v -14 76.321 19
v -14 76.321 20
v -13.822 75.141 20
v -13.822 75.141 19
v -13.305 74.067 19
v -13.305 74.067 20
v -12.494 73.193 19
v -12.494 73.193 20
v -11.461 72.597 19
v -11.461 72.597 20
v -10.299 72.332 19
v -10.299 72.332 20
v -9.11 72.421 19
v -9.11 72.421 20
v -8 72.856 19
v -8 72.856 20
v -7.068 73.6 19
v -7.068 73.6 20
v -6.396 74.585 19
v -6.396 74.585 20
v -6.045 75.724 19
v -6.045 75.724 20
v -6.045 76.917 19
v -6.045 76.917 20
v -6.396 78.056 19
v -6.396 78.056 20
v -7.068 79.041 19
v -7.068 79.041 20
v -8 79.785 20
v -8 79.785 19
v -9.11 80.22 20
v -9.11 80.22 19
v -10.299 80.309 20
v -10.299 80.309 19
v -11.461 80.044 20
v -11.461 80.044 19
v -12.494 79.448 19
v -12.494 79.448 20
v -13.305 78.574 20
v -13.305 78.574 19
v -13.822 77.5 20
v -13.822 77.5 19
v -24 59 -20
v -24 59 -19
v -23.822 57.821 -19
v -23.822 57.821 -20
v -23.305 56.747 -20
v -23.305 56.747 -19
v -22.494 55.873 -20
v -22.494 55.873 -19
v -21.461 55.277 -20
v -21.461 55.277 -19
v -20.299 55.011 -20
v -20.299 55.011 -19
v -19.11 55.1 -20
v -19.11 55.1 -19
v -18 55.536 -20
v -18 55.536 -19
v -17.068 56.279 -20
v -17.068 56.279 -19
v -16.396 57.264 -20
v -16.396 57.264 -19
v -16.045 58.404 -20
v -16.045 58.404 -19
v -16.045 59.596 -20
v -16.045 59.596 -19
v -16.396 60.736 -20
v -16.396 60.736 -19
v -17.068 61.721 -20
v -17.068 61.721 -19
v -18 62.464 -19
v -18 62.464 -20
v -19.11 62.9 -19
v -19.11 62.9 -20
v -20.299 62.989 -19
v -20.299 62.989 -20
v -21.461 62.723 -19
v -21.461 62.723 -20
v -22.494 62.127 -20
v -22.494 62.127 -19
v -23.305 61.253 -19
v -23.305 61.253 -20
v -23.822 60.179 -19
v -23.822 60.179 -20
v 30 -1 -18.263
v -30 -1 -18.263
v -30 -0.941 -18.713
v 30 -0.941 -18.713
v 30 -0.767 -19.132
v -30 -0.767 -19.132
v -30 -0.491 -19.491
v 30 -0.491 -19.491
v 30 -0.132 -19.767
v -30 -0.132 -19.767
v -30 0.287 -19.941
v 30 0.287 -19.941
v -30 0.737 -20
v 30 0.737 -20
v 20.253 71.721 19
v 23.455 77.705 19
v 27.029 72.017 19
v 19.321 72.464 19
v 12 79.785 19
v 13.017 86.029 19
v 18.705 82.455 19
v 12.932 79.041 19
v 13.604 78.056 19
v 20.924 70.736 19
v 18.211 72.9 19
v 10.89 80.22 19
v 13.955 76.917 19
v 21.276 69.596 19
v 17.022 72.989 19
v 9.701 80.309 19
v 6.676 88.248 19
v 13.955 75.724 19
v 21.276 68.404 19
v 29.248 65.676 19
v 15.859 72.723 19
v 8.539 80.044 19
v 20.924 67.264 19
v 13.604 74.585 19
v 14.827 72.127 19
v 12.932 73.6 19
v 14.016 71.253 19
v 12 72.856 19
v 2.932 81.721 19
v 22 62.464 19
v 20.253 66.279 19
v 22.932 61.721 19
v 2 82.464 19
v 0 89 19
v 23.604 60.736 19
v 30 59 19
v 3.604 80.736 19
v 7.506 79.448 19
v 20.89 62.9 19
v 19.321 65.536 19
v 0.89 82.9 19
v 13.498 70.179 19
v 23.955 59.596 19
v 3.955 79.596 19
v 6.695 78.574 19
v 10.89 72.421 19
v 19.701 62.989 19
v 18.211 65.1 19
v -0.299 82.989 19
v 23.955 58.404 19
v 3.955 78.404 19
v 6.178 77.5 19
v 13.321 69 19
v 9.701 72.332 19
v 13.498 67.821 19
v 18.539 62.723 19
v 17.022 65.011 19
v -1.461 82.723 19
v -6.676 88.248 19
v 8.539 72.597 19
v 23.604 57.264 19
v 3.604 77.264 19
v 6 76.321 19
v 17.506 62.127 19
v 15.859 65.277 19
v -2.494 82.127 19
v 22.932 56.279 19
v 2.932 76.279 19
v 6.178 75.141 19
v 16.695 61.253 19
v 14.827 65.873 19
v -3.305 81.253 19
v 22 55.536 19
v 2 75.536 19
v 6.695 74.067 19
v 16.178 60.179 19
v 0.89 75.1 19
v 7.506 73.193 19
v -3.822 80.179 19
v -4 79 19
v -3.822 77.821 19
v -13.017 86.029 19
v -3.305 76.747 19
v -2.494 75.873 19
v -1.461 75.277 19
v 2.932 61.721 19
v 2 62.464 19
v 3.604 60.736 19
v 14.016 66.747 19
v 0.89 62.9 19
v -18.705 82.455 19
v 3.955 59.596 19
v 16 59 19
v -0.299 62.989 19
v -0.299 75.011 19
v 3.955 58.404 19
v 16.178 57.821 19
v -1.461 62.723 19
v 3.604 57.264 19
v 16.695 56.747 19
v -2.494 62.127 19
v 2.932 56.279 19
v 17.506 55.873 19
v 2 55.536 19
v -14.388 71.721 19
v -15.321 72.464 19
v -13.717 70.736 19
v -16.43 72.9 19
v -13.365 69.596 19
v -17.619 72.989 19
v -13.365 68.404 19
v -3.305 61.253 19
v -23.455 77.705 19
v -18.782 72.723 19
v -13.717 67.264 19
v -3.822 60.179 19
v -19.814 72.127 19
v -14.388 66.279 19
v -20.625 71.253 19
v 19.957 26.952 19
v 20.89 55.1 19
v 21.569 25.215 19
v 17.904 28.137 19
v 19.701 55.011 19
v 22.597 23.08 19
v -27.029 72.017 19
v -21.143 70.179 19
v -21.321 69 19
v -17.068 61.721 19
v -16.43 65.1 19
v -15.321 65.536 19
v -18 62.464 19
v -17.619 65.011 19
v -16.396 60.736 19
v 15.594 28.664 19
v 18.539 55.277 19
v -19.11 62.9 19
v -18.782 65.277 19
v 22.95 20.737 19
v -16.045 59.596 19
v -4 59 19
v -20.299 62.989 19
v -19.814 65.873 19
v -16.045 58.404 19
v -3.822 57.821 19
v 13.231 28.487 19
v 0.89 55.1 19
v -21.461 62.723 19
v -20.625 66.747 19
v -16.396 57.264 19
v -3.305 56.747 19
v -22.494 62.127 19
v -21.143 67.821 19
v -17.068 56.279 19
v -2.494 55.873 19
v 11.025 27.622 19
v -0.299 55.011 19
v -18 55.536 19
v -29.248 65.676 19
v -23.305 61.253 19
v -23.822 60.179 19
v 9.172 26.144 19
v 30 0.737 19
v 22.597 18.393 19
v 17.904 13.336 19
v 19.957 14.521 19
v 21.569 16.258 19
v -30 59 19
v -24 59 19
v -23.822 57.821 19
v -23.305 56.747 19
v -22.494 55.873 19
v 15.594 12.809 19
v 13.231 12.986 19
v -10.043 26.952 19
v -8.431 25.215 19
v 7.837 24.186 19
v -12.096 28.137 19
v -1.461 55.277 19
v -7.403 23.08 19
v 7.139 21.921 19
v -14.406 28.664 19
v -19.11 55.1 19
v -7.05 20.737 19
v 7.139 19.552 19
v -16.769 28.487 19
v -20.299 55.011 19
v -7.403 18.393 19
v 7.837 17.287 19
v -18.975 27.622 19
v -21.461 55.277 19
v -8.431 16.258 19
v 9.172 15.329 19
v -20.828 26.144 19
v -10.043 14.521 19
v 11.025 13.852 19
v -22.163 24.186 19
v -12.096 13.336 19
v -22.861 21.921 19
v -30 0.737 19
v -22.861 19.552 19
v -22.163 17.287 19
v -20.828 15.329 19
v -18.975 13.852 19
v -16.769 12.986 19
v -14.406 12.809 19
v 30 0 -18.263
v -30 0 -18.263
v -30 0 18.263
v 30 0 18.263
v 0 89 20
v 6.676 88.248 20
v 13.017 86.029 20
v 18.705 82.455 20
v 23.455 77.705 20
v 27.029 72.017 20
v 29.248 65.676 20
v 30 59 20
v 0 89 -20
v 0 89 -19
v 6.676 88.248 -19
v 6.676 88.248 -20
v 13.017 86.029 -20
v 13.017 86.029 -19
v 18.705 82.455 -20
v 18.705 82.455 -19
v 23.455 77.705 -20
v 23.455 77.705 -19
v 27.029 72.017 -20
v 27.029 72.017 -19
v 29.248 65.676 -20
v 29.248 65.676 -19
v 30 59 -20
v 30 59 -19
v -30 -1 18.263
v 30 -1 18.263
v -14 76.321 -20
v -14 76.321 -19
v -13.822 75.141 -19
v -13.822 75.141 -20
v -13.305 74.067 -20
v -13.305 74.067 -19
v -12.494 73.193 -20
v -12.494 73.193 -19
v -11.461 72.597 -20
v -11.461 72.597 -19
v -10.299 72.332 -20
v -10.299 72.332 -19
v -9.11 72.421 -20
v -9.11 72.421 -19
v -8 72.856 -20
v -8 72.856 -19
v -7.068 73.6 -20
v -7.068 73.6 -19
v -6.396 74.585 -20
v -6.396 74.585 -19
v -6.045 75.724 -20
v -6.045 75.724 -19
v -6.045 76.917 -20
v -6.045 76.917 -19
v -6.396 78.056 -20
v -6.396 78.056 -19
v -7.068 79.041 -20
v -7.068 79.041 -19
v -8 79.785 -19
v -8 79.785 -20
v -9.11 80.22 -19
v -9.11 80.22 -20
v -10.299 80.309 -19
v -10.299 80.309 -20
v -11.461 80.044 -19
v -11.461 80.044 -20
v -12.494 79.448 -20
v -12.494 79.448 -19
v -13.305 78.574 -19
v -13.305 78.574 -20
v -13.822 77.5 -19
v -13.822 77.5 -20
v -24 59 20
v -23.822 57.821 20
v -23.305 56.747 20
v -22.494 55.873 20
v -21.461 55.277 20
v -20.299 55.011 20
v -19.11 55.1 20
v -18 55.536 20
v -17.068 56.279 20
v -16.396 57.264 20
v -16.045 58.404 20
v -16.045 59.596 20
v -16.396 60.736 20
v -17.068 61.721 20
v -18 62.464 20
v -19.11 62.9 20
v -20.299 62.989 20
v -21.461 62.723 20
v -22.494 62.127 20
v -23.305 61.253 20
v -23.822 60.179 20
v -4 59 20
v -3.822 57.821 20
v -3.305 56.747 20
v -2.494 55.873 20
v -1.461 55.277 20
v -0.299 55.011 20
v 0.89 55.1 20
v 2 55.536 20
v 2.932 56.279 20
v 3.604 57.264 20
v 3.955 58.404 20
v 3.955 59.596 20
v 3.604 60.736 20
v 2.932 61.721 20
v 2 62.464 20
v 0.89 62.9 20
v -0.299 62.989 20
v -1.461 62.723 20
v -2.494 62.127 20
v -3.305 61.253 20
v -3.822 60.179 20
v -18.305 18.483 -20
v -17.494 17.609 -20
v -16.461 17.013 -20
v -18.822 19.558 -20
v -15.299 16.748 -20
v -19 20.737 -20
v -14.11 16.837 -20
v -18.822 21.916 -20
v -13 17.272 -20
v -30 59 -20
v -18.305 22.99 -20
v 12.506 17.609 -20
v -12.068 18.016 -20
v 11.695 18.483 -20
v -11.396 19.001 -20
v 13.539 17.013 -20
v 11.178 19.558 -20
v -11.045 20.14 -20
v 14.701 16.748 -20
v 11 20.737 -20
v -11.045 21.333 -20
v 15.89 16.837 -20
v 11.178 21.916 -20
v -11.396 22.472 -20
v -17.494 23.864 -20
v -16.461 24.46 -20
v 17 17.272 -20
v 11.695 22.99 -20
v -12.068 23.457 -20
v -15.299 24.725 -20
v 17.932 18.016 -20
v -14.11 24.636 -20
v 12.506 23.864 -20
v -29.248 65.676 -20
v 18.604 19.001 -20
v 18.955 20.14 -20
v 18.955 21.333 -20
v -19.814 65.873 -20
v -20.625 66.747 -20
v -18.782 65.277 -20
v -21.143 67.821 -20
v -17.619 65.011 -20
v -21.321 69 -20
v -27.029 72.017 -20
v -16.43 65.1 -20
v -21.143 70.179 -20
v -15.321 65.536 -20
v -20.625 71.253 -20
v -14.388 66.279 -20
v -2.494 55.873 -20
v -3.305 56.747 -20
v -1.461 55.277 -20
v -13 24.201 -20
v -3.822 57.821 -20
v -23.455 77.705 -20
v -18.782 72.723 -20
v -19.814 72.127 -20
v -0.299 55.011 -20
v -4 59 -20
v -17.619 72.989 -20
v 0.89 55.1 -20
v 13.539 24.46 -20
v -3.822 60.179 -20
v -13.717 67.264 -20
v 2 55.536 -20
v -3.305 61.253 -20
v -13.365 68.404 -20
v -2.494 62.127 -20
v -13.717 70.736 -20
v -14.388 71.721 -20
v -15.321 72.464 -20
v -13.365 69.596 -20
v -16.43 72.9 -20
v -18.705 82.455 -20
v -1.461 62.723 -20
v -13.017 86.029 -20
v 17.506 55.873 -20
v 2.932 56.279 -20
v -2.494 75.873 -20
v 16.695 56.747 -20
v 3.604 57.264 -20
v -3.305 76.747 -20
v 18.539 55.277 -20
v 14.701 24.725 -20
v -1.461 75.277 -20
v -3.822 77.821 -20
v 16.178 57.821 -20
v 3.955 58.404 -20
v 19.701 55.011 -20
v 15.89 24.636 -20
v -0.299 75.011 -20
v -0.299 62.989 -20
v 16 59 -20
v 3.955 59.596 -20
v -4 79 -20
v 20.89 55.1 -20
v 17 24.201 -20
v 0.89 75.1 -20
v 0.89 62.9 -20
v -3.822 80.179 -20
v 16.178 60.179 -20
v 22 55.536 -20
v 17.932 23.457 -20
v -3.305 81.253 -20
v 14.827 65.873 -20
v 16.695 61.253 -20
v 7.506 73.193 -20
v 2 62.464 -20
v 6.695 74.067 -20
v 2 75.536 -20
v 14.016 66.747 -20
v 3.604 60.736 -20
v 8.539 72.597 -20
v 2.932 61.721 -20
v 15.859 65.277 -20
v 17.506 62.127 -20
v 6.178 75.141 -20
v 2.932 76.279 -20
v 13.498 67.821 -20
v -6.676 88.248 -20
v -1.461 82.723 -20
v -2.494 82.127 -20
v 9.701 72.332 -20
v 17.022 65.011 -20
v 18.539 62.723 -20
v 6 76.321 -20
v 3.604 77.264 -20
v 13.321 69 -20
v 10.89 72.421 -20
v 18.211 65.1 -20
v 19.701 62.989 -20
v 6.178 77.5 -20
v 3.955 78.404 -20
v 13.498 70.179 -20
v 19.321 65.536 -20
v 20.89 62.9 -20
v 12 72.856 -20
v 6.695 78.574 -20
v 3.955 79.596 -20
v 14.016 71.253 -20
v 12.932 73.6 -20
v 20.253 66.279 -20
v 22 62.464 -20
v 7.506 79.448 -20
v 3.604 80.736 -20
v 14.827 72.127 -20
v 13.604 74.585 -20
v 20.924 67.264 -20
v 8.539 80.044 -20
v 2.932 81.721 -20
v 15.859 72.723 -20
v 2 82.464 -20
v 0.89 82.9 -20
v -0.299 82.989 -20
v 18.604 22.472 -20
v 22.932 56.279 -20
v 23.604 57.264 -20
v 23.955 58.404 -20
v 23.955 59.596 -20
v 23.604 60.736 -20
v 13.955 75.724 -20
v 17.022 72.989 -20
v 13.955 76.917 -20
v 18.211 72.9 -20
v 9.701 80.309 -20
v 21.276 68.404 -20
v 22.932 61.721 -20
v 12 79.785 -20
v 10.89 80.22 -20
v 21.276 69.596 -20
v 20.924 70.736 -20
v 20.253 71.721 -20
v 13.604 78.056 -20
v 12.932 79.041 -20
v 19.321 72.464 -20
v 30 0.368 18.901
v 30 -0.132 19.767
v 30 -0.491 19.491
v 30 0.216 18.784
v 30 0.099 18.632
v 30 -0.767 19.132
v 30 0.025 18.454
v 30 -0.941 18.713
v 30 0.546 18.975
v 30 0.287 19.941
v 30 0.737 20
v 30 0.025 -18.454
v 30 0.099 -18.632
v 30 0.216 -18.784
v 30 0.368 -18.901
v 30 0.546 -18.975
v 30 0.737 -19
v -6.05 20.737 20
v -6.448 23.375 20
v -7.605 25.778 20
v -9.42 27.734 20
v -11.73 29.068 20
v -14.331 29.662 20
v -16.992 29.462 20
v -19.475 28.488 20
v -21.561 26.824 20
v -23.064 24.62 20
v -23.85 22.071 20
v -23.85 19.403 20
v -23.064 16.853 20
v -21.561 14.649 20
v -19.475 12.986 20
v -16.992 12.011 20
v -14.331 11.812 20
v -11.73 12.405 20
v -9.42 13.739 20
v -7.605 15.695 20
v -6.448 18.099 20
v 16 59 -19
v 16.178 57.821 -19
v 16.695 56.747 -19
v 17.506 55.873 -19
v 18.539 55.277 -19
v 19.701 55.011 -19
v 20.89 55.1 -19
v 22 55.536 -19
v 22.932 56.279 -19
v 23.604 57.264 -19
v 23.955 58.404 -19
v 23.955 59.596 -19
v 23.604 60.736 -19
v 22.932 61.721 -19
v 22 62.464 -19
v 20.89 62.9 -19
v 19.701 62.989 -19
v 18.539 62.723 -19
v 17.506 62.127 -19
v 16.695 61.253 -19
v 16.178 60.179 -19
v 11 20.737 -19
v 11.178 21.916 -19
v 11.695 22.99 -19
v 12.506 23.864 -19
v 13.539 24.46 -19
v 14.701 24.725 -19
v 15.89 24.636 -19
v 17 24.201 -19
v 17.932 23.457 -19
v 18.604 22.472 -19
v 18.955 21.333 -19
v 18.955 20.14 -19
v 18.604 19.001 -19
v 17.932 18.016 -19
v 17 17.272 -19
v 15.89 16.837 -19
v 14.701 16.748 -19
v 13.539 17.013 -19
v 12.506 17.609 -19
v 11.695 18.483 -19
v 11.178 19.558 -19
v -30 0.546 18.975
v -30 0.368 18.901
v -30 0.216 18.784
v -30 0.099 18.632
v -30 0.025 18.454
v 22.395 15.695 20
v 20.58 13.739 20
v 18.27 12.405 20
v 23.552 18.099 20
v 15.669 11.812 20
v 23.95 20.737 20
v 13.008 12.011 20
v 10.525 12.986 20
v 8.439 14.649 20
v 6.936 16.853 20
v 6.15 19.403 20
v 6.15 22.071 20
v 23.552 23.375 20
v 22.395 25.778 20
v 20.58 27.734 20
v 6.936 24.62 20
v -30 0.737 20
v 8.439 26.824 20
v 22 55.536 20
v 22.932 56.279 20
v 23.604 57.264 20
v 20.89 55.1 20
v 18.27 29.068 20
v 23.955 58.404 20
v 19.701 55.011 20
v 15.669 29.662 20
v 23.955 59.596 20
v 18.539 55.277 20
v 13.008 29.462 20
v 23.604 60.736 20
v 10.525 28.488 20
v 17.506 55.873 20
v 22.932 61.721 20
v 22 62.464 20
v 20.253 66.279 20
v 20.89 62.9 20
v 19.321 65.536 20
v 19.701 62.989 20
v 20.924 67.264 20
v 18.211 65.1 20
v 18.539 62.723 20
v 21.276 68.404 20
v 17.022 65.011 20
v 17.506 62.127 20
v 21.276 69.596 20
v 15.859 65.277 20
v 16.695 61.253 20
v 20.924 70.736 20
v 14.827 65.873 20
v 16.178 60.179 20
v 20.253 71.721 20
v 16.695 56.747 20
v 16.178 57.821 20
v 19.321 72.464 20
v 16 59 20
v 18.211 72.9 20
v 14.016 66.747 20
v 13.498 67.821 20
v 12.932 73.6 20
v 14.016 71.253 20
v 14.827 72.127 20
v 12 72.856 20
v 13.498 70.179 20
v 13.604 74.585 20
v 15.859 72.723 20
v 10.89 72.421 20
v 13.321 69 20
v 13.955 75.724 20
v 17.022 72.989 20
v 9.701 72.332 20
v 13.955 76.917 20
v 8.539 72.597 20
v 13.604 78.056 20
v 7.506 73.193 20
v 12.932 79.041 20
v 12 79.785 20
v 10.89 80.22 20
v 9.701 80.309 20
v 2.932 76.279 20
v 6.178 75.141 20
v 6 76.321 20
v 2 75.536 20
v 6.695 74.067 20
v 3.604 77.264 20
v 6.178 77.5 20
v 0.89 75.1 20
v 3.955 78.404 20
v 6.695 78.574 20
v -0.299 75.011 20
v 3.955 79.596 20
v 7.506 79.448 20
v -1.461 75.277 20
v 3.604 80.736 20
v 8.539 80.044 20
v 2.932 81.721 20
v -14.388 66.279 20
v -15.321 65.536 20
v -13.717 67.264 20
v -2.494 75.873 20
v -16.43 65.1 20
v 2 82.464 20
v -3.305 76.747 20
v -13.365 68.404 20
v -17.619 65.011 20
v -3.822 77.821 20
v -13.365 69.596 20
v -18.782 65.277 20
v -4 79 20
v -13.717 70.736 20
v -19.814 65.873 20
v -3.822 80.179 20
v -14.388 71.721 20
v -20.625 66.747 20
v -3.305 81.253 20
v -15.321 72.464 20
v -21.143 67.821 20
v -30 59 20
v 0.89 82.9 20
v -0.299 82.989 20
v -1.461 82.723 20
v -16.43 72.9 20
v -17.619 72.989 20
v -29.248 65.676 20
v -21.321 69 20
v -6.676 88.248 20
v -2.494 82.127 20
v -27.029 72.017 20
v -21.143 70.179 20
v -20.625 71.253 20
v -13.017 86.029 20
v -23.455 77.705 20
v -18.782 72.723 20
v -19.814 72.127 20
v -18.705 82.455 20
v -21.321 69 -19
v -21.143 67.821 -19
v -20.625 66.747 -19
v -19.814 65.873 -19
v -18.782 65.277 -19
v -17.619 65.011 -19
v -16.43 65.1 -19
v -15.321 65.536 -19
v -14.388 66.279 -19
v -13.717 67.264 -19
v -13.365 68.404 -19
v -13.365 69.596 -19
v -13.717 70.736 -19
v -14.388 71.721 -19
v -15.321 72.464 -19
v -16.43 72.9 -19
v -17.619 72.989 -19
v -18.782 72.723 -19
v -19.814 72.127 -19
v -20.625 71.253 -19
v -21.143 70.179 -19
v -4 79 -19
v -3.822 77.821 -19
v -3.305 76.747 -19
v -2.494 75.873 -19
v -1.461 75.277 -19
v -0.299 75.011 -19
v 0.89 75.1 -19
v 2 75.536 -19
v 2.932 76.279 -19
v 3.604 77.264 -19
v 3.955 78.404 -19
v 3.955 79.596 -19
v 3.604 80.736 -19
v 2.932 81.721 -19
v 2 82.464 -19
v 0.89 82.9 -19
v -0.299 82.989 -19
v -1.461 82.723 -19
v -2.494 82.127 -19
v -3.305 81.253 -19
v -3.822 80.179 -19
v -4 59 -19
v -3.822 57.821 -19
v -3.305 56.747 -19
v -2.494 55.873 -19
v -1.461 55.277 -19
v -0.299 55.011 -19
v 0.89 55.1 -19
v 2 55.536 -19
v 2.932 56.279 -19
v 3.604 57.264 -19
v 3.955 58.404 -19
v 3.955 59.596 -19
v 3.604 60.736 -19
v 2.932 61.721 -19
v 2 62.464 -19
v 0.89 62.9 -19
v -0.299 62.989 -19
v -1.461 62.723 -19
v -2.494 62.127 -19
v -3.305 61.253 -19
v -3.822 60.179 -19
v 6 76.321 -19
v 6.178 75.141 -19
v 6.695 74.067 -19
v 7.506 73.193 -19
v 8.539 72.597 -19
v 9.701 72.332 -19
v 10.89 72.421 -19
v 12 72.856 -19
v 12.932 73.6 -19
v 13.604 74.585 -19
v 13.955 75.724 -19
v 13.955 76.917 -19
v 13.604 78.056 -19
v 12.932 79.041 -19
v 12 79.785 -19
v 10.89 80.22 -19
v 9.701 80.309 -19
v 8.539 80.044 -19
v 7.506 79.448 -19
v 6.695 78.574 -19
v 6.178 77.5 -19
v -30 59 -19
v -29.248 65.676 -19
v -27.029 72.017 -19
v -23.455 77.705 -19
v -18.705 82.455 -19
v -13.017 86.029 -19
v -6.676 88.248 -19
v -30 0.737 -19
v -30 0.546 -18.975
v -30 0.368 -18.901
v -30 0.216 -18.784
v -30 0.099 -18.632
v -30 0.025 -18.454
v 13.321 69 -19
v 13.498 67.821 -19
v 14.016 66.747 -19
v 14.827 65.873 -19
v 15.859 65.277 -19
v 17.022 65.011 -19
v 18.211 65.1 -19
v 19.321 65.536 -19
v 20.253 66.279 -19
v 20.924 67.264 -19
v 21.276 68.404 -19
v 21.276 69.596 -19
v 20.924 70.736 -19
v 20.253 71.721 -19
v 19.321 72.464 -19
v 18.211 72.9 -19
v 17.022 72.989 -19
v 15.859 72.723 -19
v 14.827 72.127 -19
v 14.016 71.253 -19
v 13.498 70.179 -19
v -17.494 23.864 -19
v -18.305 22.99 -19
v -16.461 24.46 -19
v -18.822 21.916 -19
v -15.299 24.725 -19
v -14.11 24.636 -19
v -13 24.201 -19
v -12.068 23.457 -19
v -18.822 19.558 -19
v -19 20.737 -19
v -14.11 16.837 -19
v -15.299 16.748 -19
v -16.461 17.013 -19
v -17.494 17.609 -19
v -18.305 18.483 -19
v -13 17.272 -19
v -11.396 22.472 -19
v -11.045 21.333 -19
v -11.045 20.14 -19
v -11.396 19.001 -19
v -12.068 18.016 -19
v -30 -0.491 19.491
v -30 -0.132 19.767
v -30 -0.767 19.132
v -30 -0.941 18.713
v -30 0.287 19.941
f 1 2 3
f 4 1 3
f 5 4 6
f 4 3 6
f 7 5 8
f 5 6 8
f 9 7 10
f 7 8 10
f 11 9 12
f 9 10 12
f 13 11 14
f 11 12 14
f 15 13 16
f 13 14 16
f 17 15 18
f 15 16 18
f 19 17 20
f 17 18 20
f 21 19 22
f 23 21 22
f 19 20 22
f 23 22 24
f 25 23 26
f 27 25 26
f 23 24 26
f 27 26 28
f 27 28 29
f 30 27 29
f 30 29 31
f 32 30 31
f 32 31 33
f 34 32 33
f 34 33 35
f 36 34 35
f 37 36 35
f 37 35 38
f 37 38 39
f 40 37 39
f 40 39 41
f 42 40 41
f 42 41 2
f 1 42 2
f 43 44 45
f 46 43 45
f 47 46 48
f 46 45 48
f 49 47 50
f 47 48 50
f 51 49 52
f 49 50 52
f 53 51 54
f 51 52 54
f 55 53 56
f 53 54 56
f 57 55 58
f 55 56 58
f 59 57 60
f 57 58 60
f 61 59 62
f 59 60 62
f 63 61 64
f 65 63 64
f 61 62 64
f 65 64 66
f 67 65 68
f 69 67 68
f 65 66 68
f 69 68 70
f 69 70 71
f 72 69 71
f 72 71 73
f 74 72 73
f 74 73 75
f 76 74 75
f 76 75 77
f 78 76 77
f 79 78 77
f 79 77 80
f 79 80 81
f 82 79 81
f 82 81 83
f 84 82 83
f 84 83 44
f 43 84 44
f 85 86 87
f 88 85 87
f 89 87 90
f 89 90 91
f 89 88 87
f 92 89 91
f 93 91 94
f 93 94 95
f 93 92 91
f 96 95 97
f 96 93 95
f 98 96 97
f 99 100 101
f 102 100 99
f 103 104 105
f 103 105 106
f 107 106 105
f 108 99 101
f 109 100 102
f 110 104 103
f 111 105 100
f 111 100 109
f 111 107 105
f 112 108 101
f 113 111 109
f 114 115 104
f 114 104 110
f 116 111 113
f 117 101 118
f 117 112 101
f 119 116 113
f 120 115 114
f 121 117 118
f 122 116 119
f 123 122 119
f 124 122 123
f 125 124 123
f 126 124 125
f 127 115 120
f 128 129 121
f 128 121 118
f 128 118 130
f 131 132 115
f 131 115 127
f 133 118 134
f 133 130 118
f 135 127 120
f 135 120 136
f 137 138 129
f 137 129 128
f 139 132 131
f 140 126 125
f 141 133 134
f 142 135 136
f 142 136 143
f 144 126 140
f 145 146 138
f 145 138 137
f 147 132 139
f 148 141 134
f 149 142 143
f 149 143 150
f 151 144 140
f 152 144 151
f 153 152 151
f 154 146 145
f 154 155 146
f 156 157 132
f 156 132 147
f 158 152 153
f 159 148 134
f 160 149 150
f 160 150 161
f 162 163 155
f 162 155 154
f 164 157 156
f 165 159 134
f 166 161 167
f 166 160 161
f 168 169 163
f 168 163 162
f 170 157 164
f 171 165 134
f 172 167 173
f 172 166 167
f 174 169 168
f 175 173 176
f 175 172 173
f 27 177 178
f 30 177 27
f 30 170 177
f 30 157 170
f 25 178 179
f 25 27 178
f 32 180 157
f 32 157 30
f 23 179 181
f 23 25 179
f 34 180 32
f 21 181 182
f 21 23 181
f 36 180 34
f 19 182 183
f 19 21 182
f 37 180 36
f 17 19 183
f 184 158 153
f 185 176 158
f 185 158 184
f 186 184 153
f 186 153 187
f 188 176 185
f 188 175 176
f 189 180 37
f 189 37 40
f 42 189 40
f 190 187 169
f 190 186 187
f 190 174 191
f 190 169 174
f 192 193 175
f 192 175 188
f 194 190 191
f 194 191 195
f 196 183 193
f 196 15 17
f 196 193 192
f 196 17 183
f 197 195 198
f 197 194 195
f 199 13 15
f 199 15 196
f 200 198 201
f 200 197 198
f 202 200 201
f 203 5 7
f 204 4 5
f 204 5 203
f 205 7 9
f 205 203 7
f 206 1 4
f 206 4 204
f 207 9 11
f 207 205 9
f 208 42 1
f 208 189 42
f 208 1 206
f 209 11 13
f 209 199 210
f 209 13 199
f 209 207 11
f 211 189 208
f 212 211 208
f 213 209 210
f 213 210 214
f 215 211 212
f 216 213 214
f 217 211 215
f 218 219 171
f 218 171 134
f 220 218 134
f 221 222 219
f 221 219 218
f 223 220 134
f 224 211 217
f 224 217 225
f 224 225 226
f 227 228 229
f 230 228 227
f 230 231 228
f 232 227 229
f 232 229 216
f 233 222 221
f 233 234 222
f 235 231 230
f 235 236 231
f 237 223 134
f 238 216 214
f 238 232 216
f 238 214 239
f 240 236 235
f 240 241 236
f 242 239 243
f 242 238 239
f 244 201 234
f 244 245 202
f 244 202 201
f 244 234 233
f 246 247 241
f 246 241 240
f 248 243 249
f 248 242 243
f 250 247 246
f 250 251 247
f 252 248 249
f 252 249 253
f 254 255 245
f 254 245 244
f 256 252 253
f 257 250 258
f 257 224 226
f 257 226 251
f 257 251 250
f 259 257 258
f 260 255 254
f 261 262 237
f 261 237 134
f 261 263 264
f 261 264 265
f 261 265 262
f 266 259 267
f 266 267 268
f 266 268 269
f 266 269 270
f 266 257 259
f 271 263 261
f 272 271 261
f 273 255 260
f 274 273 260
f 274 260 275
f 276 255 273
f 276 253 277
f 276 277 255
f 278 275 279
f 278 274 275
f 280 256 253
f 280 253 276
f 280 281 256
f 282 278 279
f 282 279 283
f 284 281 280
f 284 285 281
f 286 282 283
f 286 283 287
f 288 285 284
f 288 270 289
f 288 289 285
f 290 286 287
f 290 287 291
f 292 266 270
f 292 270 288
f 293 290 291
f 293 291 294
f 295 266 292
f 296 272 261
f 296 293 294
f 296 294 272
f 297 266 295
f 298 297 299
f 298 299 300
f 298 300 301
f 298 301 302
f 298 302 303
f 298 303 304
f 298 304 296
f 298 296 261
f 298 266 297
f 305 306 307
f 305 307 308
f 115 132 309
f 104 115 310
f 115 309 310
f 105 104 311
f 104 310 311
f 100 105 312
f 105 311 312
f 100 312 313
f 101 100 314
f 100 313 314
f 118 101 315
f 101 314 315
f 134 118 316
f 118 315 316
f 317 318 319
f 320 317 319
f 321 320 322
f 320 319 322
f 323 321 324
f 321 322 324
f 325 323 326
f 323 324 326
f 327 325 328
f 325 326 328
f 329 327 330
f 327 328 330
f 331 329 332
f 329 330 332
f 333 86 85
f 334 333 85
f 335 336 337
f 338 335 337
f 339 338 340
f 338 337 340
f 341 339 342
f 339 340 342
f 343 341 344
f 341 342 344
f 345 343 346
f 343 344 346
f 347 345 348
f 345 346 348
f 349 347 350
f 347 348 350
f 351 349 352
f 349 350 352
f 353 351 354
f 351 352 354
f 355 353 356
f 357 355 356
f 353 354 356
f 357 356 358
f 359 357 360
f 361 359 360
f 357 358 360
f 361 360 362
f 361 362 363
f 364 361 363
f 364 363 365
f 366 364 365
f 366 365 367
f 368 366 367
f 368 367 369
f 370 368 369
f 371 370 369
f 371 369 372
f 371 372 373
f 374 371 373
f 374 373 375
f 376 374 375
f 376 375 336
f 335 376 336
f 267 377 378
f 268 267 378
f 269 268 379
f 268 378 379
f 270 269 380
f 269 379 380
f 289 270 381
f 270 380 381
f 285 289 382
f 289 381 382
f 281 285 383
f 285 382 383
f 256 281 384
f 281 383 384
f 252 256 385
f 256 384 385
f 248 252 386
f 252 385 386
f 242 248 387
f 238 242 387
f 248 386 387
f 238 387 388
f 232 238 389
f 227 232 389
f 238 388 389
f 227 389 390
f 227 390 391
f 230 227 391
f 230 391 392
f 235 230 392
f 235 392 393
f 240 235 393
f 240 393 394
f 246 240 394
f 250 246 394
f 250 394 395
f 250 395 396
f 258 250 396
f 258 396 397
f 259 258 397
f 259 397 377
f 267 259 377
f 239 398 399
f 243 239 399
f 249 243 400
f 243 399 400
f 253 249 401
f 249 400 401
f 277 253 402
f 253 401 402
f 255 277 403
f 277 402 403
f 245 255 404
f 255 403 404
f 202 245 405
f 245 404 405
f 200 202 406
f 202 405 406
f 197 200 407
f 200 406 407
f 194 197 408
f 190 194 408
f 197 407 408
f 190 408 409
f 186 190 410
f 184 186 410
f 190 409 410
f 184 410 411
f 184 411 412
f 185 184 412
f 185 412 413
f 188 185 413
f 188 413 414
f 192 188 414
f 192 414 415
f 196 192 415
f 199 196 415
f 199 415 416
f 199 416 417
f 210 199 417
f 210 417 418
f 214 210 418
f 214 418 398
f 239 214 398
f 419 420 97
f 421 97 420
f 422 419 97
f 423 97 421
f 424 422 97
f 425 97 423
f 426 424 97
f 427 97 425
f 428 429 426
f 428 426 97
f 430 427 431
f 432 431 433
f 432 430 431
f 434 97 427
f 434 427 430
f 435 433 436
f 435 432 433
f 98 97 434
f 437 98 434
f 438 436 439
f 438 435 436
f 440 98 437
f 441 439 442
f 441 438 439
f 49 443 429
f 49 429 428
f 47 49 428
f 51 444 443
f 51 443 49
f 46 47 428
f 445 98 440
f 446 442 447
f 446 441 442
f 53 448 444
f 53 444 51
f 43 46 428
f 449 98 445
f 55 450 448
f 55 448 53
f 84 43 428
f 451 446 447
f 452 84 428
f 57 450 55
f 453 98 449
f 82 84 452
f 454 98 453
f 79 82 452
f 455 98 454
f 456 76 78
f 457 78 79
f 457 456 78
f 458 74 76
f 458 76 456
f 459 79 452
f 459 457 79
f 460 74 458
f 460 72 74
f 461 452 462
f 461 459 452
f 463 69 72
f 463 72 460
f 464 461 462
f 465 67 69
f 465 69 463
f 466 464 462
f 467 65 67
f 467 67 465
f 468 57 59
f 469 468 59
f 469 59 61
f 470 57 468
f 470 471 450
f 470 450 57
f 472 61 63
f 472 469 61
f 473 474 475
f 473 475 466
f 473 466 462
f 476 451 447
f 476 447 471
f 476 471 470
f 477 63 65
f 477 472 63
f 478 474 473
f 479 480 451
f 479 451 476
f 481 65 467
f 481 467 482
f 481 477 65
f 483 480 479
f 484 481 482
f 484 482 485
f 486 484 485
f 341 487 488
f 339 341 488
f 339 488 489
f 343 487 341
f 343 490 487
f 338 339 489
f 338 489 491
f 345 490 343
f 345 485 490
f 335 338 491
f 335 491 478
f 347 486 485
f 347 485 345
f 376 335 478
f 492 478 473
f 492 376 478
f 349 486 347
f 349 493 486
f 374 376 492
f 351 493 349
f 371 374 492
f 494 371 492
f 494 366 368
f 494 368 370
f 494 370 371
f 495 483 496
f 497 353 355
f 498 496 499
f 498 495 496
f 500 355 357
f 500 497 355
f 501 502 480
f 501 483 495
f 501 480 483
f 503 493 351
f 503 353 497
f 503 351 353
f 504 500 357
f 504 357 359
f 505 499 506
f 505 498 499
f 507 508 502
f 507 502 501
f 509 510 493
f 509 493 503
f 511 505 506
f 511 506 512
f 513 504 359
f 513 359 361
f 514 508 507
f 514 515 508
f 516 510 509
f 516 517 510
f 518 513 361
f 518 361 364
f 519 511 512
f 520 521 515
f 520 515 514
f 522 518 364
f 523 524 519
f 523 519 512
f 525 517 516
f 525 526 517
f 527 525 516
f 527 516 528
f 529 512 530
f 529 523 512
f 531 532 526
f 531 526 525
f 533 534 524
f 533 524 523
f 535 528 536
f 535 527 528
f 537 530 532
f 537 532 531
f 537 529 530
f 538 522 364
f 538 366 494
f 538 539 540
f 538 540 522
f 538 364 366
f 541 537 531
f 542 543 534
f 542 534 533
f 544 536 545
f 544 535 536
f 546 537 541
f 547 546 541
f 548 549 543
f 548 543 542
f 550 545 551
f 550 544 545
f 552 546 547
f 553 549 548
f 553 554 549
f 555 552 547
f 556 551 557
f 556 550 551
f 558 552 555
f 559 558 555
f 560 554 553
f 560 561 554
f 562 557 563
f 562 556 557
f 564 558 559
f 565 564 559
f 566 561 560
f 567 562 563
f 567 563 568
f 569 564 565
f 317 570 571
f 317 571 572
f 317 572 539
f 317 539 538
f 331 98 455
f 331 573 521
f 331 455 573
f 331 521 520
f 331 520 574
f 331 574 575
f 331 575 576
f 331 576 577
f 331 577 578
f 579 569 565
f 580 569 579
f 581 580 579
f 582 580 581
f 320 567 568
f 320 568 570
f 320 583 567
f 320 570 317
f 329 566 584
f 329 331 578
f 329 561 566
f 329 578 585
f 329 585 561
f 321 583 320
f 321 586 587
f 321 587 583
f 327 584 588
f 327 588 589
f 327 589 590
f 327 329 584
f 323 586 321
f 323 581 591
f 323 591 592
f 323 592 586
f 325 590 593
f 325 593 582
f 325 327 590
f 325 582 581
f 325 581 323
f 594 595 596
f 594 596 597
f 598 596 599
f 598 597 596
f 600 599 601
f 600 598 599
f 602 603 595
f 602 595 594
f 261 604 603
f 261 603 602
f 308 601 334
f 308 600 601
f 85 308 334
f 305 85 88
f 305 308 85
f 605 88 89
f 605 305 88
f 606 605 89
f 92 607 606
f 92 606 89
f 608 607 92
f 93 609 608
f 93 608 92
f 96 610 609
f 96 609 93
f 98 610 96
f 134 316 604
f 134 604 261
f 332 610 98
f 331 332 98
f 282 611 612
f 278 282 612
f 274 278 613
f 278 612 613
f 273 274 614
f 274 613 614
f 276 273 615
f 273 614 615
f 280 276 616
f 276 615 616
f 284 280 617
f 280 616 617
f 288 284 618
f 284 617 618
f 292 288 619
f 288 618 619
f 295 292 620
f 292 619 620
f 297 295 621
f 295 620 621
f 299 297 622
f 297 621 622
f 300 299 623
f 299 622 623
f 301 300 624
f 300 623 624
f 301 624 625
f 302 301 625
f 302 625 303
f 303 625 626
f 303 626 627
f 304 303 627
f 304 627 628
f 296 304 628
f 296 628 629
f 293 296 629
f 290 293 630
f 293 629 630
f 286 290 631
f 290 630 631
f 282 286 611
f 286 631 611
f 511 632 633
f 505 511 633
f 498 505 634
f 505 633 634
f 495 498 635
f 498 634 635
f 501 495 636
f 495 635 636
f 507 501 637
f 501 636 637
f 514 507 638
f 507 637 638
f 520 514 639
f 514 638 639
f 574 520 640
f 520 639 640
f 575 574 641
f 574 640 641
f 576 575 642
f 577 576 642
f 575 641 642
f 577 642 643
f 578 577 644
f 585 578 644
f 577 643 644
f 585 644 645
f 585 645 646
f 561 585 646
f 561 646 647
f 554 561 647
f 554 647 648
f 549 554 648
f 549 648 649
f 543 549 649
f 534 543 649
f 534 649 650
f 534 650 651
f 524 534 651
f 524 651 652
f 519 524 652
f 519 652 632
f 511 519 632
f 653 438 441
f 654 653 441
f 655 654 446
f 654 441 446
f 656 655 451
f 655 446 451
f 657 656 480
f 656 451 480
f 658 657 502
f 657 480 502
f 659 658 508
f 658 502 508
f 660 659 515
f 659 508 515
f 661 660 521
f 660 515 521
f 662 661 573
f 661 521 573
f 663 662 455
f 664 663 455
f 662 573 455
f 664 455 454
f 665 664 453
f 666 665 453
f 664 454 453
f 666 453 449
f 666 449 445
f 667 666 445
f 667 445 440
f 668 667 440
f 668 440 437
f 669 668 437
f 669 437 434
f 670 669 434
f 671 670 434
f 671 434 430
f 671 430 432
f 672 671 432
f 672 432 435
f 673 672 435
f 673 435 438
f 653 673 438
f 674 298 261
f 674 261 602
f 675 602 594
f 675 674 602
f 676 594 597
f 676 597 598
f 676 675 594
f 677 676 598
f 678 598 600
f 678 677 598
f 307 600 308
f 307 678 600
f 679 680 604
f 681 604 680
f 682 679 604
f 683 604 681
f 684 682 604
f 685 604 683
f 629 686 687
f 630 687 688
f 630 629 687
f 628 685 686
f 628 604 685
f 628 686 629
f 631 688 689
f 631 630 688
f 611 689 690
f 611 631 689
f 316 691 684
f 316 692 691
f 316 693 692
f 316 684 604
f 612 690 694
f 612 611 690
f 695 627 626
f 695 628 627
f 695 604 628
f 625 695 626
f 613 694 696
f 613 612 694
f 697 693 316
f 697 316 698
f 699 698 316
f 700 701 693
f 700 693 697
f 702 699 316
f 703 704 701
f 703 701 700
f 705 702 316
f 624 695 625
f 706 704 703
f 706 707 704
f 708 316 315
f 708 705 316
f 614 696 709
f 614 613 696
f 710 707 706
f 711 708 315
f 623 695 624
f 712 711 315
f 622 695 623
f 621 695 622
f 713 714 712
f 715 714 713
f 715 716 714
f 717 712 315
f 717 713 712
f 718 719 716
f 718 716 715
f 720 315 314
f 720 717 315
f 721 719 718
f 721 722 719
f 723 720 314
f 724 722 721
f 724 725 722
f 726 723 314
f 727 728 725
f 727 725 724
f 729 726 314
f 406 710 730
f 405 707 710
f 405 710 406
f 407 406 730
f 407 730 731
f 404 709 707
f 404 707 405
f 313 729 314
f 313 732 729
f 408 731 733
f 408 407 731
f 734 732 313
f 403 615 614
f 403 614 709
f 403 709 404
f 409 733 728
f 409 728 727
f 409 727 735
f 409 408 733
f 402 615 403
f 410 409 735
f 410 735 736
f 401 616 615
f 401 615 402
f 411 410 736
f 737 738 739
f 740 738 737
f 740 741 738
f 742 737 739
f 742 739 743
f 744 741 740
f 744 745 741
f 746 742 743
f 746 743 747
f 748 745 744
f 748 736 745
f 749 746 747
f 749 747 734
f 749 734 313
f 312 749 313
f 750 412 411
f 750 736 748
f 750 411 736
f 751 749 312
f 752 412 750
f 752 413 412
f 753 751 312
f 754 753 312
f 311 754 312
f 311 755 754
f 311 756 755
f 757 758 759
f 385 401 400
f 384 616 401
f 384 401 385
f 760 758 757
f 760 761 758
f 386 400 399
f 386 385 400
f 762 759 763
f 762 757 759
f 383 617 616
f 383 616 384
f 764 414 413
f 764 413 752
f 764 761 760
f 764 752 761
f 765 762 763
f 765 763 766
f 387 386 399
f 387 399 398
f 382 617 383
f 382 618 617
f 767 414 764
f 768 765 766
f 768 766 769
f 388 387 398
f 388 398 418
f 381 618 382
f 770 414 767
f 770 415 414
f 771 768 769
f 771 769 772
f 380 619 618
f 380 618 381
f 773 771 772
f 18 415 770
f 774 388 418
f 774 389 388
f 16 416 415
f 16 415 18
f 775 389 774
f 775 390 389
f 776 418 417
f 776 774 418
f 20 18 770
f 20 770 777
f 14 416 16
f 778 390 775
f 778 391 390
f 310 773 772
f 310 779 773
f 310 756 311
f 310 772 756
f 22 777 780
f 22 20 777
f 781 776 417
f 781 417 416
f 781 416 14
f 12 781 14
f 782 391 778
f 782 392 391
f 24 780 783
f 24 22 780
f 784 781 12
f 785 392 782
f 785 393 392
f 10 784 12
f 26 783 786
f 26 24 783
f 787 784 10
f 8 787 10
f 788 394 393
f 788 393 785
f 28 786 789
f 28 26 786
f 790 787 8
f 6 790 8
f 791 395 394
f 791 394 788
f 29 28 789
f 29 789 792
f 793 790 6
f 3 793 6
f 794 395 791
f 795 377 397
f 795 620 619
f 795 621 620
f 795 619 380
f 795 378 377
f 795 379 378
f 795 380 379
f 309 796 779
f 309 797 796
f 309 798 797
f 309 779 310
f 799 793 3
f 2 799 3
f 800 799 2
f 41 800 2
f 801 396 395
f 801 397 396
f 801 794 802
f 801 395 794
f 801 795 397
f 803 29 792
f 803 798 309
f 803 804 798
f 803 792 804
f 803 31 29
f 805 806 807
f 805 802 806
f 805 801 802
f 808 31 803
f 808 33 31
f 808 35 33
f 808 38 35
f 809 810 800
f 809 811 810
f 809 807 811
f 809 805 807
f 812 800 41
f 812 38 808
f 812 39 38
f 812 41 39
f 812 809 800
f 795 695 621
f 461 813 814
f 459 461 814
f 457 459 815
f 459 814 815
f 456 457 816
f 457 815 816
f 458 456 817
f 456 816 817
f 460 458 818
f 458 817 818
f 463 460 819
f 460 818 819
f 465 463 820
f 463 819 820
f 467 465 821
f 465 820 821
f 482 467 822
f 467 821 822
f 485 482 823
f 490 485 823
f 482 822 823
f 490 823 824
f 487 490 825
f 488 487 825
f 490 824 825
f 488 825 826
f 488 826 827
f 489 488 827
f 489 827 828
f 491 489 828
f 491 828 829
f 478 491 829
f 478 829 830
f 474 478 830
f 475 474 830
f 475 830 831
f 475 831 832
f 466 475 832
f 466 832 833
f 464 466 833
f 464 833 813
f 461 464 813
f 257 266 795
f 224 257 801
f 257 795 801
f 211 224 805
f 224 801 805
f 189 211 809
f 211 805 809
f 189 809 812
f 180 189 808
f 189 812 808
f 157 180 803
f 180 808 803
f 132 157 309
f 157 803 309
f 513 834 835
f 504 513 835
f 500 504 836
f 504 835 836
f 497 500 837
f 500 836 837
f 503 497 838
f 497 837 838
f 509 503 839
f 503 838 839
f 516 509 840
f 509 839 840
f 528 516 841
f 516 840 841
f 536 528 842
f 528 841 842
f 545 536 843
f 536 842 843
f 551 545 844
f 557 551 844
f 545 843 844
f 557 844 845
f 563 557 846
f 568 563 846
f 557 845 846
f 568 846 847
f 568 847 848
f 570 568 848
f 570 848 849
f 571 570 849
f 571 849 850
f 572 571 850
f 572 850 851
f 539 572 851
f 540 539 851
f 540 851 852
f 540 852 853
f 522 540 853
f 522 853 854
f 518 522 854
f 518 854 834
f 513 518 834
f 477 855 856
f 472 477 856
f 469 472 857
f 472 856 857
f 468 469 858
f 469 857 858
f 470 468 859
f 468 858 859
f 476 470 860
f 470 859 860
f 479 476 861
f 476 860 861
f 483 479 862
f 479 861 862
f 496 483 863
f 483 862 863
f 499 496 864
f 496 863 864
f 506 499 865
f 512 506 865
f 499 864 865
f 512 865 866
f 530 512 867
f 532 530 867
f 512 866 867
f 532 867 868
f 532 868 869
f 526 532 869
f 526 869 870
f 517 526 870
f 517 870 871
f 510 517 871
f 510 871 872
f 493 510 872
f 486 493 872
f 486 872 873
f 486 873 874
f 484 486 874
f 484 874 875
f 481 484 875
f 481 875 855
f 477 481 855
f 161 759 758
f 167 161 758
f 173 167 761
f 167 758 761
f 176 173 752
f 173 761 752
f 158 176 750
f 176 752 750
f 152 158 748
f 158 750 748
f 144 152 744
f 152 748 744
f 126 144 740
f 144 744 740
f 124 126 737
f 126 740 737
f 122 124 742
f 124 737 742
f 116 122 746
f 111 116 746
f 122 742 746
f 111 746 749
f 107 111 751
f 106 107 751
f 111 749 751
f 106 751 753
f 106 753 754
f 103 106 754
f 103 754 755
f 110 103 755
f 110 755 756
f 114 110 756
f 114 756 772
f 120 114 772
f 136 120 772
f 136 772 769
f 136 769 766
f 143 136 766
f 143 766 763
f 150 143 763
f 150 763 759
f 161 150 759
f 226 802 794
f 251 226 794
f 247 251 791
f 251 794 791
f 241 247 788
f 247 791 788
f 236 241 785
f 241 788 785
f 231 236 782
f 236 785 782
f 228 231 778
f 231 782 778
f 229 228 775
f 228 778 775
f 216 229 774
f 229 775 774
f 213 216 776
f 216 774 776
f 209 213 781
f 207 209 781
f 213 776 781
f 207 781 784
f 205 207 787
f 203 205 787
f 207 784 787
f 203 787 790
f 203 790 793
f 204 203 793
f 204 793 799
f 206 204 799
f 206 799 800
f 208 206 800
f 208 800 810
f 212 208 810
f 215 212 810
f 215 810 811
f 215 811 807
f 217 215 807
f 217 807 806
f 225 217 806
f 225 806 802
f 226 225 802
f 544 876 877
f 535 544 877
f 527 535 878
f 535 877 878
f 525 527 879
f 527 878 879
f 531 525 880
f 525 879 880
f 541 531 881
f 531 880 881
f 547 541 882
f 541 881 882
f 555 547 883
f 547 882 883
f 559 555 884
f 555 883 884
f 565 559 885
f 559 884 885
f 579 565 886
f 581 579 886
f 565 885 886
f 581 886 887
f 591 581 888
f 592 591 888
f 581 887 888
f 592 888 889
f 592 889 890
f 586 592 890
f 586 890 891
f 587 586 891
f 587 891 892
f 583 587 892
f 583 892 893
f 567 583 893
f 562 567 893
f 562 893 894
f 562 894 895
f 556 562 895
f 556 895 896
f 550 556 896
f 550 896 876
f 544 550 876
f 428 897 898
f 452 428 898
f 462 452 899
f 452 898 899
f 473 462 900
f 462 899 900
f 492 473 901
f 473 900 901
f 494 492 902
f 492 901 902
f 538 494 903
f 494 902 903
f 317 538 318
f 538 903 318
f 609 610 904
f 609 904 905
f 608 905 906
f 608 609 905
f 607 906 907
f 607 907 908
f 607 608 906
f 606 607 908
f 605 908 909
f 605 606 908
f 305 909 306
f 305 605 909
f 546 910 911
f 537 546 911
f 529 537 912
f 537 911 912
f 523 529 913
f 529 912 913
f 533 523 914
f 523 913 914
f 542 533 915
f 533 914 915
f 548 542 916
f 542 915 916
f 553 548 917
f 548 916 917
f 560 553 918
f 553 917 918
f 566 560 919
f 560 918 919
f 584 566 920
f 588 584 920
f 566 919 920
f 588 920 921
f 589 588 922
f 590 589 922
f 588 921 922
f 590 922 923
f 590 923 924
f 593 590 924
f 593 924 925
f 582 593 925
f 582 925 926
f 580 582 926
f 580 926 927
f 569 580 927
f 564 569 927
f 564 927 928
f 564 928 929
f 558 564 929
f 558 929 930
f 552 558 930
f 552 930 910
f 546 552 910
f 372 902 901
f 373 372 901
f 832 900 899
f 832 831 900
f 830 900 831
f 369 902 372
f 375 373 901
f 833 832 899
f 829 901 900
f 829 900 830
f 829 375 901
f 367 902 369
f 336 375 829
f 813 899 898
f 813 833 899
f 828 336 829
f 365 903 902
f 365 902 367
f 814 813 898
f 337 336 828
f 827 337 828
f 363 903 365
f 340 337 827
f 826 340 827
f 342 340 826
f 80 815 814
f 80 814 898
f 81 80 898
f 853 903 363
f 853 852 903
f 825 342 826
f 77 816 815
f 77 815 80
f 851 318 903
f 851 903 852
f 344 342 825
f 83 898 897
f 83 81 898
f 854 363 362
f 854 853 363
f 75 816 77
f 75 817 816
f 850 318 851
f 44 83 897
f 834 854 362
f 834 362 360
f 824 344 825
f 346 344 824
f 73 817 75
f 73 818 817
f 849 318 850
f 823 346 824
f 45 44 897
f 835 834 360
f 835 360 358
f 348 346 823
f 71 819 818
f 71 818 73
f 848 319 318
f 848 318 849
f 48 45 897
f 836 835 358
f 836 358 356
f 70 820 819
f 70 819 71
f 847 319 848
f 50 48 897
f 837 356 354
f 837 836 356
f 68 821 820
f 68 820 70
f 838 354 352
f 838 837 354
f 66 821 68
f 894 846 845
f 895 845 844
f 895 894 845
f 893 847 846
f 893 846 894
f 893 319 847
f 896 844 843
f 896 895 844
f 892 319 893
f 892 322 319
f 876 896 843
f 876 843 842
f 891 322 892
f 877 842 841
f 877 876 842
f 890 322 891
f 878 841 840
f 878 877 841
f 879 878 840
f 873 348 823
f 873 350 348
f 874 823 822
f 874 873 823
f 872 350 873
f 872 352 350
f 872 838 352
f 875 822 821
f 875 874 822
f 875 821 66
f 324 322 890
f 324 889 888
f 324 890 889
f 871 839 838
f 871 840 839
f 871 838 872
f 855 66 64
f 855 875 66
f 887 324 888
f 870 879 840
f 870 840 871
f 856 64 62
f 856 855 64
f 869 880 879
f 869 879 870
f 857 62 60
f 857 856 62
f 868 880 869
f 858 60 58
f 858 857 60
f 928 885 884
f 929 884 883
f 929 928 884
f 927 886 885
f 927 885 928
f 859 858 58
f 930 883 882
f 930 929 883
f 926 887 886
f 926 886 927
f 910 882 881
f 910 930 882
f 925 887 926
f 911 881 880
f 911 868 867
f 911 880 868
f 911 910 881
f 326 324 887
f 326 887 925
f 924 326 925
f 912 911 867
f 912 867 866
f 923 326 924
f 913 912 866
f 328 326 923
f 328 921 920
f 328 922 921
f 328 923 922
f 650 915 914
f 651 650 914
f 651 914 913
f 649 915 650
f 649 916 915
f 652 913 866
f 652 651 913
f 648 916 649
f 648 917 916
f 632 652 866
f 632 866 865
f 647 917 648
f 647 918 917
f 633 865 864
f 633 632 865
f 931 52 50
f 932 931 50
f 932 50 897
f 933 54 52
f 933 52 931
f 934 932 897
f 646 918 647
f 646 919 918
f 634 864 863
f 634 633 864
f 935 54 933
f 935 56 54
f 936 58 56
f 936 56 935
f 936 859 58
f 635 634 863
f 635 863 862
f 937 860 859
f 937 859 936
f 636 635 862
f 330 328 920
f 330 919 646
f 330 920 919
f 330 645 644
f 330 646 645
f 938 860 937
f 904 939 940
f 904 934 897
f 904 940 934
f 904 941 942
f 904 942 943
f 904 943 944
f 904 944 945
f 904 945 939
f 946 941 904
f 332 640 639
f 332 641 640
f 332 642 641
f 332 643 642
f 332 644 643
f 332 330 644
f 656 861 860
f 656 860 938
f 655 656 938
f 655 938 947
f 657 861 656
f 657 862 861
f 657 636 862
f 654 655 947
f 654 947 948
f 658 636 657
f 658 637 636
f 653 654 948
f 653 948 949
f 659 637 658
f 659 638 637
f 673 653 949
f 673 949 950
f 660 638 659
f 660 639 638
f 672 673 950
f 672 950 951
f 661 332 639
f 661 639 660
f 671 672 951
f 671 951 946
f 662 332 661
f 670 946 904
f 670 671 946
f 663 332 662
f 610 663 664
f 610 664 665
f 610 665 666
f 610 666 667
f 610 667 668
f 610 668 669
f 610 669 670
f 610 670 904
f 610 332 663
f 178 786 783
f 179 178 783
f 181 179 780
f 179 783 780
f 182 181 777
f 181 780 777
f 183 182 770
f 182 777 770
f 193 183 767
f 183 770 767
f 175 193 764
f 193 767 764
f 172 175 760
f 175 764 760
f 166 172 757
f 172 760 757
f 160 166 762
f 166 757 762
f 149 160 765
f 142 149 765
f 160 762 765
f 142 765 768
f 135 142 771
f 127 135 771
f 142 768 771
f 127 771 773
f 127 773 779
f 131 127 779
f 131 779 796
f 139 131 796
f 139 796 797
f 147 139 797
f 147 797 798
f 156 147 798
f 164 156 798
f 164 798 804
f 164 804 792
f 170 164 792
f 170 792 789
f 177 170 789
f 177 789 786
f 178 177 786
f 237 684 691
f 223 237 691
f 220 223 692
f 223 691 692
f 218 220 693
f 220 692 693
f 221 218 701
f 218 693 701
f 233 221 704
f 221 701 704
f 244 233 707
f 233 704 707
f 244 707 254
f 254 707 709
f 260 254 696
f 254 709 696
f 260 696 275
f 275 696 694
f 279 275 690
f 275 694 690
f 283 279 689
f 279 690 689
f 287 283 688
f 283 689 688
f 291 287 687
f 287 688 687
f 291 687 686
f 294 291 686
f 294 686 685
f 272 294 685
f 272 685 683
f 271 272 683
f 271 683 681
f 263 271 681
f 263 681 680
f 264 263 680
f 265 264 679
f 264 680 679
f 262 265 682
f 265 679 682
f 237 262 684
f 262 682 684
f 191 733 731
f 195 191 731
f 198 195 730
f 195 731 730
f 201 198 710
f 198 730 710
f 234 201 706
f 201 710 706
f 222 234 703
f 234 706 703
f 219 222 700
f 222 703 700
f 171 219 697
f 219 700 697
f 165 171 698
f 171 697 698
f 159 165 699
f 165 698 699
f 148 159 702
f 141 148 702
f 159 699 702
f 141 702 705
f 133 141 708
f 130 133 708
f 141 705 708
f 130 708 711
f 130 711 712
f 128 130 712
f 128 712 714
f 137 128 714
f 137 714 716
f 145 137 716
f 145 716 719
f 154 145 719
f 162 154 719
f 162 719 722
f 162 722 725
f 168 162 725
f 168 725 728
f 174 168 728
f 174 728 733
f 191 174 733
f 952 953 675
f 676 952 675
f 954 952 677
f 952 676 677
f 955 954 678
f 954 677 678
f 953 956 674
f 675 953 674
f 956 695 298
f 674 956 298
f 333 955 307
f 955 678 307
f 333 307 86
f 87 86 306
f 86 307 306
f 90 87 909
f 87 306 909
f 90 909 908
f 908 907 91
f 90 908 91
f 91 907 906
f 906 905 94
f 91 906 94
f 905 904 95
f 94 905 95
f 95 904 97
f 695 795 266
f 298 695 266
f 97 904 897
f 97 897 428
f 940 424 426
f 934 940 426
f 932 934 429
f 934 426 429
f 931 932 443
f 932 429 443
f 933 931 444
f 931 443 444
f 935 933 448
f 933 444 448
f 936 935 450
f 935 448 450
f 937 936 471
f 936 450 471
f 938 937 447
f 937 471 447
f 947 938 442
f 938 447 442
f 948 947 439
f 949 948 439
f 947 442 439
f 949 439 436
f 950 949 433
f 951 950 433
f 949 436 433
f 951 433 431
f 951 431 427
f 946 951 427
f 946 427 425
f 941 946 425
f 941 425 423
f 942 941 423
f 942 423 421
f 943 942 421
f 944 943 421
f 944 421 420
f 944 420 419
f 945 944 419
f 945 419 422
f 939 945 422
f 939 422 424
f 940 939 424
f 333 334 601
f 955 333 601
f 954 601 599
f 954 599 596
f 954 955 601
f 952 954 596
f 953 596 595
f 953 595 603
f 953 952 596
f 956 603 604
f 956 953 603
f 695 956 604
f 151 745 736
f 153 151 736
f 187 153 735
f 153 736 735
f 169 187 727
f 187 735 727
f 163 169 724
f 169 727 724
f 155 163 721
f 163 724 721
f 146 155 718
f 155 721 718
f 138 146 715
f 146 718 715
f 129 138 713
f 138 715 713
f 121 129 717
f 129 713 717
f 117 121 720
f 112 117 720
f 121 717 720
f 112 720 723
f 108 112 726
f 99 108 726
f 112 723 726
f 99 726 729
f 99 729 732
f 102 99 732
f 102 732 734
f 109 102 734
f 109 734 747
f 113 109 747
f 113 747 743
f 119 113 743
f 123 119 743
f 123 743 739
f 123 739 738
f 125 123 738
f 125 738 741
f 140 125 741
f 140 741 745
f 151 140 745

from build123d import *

# Parameters (mm, degrees)
CROQUIS1_W                       = 60
CROQUIS1_H                       = 40
BRIDA_BASE2_DEPTH                = 1
BRIDA_DE_ARISTA1_STRIP_W         = 5.4732
BRIDA_DE_ARISTA1_STRIP_H         = 1
BRIDA_DE_ARISTA1_STRIP_CUT_DEPTH = 60
BRIDA_DE_ARISTA1_DEPTH           = 60
BRIDA_DE_ARISTA2_STRIP_W         = 5.4732
BRIDA_DE_ARISTA2_STRIP_H         = 1
BRIDA_DE_ARISTA2_STRIP_CUT_DEPTH = 60
BRIDA_DE_ARISTA2_DEPTH           = 60
CROQUIS17_R                      = 4
CORTAR_EXTRUIR1_DEPTH            = 50
CROQUIS18_R                      = 4
CORTAR_EXTRUIR2_DEPTH            = 10
CROQUIS19_R                      = 8.95
CORTAR_EXTRUIR3_DEPTH            = 1
CORTAR_EXTRUIR3_DRAFT            = -45
CORTAR_EXTRUIR3_PROFILE_2_DEPTH  = 1
CORTAR_EXTRUIR3_PROFILE_2_DRAFT  = -45


# Sheet-metal steps are written as plain solids
with BuildPart() as part:
    # Croquis1 → Brida base2 (new body)
    with BuildSketch(Plane(origin=(0, 0, 0), x_dir=(1, 0, 0), z_dir=(0, 1, 0))):
        Rectangle(CROQUIS1_W, CROQUIS1_H)
    extrude(amount=-BRIDA_BASE2_DEPTH)

    # Brida de arista1 strip (across the edge) → Brida de arista1 strip cut (cut)
    with BuildSketch(Plane(origin=(-30, 0, 20), x_dir=(0, 0, -1), z_dir=(1, 0, 0))):
        with Locations((-1, -0.5)):
            Rectangle(BRIDA_DE_ARISTA1_STRIP_W, BRIDA_DE_ARISTA1_STRIP_H)
    extrude(amount=BRIDA_DE_ARISTA1_STRIP_CUT_DEPTH, mode=Mode.SUBTRACT)

    # Brida de arista1 section (across the edge) → Brida de arista1 (add)
    with BuildSketch(Plane(origin=(-30, 0, 20), x_dir=(0, 0, -1), z_dir=(1, 0, 0))):
        with BuildLine():
            Line((0, 0.7366), (0, 89))
            Line((0, 89), (1, 89))
            Line((1, 89), (1, 0.7366))
            ThreePointArc((1, 0.7366), (1.215745145, 0.215745145), (1.7366, 0))
            Line((1.7366, 0), (1.7366, -1))
            ThreePointArc((1.7366, -1), (0.508638364, -0.491361636), (0, 0.7366))
        make_face()
    extrude(amount=BRIDA_DE_ARISTA1_DEPTH)

    # Brida de arista2 strip (across the edge) → Brida de arista2 strip cut (cut)
    with BuildSketch(Plane(origin=(30, 0, -20), x_dir=(0, 0, 1), z_dir=(-1, 0, 0))):
        with Locations((-1, -0.5)):
            Rectangle(BRIDA_DE_ARISTA2_STRIP_W, BRIDA_DE_ARISTA2_STRIP_H)
    extrude(amount=BRIDA_DE_ARISTA2_STRIP_CUT_DEPTH, mode=Mode.SUBTRACT)

    # Brida de arista2 section (across the edge) → Brida de arista2 (add)
    with BuildSketch(Plane(origin=(30, 0, -20), x_dir=(0, 0, 1), z_dir=(-1, 0, 0))):
        with BuildLine():
            Line((0, 0.7366), (0, 89))
            Line((0, 89), (1, 89))
            Line((1, 89), (1, 0.7366))
            ThreePointArc((1, 0.7366), (1.215745145, 0.215745145), (1.7366, 0))
            Line((1.7366, 0), (1.7366, -1))
            ThreePointArc((1.7366, -1), (0.508638364, -0.491361636), (0, 0.7366))
        make_face()
    extrude(amount=BRIDA_DE_ARISTA2_DEPTH)

    # Croquis17 → Cortar-Extruir1 (cut)
    with BuildSketch(Plane.XY.offset(20)):
        with BuildLine():
            ThreePointArc((-7.5e-08, 89), (21.213203409, 80.213203462), (30, 59))
            Line((30, 59), (30, 89))
            Line((30, 89), (-7.5e-08, 89))
        make_face()
        with BuildLine():
            ThreePointArc((-30, 59), (-21.213203462, 80.213203409), (-7.5e-08, 89))
            Line((-7.5e-08, 89), (-30, 89))
            Line((-30, 89), (-30, 59))
        make_face()
        with Locations(Location((0, 59, 0), (0, 0, 180))):
            Circle(CROQUIS17_R)
        with Locations(Location((20, 59, 0), (0, 0, 180))):
            Circle(CROQUIS17_R)
        with Locations(Location((10, 76.320508076, 0), (0, 0, 180))):
            Circle(CROQUIS17_R)
        with Locations(Location((17.320508076, 69, 0), (0, 0, 180))):
            Circle(CROQUIS17_R)
        with Locations(Location((0, 79, 0), (0, 0, 180))):
            Circle(CROQUIS17_R)
        with Locations(Location((-10, 76.320508076, 0), (0, 0, 180))):
            Circle(CROQUIS17_R)
        with Locations(Location((-17.320508076, 69, 0), (0, 0, 180))):
            Circle(CROQUIS17_R)
        with Locations(Location((-20, 59, 0), (0, 0, 180))):
            Circle(CROQUIS17_R)
    extrude(amount=-CORTAR_EXTRUIR1_DEPTH, mode=Mode.SUBTRACT)

    # Croquis18 → Cortar-Extruir2 (cut)
    with BuildSketch(Plane(origin=(0, 0, -20), x_dir=(-1, 0, 0), z_dir=(0, 0, -1))):
        with Locations((-15, 20.7366)):
            Circle(CROQUIS18_R)
        with Locations((15, 20.7366)):
            Circle(CROQUIS18_R)
    extrude(amount=-CORTAR_EXTRUIR2_DEPTH, mode=Mode.SUBTRACT)


with BuildPart() as cortar_extruir3_tool:
    # Croquis19 → Cortar-Extruir3 (with draft: the straight prism first)
    with BuildSketch(Plane.XY.offset(20)):
        with Locations((-15, 20.7366)):
            Circle(CROQUIS19_R)
    extrude(amount=-CORTAR_EXTRUIR3_DEPTH)
    # Cortar-Extruir3: the draft: its side faces are tilted about the plane it starts from
    cortar_extruir3_sides = [cortar_extruir3_tool.faces().sort_by_distance(p)[0] for p in [
        (-23.95, 20.7366, 19.5),
    ]]
    draft(cortar_extruir3_sides, Plane.XY.offset(20), CORTAR_EXTRUIR3_DRAFT)


with BuildPart() as part_1:
    add(part.part)

    # Cortar-Extruir3: cut by cortar_extruir3_tool
    add(cortar_extruir3_tool.part, mode=Mode.SUBTRACT)


with BuildPart() as cortar_extruir3_profile_2_tool:
    # Croquis19 → Cortar-Extruir3 profile 2 (with draft: the straight prism first)
    with BuildSketch(Plane.XY.offset(20)):
        with Locations((15, 20.7366)):
            Circle(CROQUIS19_R)
    extrude(amount=-CORTAR_EXTRUIR3_PROFILE_2_DEPTH)
    # Cortar-Extruir3 profile 2: the draft: its side faces are tilted about the plane it starts from
    cortar_extruir3_profile_2_sides = [cortar_extruir3_profile_2_tool.faces().sort_by_distance(p)[0] for p in [
        (6.05, 20.7366, 19.5),
    ]]
    draft(cortar_extruir3_profile_2_sides, Plane.XY.offset(20), CORTAR_EXTRUIR3_PROFILE_2_DRAFT)


with BuildPart() as part_2:
    add(part_1.part)

    # Cortar-Extruir3 profile 2: cut by cortar_extruir3_profile_2_tool
    add(cortar_extruir3_profile_2_tool.part, mode=Mode.SUBTRACT)


solid = part_2.part
